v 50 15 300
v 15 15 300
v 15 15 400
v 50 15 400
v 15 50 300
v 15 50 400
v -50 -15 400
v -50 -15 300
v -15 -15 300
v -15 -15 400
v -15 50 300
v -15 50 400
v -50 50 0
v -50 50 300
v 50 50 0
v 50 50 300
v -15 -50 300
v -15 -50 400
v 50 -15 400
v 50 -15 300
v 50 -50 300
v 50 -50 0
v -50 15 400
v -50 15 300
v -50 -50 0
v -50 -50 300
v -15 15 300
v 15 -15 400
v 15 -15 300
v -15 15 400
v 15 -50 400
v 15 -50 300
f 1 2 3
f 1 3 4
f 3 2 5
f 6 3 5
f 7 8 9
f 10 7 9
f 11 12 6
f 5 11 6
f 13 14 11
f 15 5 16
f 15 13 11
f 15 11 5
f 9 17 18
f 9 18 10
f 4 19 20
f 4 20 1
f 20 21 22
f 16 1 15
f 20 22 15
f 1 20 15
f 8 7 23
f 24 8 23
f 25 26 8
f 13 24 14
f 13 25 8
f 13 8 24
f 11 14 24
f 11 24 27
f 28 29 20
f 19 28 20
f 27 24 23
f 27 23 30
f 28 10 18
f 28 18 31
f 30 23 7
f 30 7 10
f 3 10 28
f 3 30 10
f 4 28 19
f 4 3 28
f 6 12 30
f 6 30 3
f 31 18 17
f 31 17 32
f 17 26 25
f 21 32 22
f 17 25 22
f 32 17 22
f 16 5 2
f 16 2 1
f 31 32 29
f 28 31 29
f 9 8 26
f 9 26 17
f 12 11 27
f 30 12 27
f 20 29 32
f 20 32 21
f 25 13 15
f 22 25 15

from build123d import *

# Parameters (mm, degrees)
F0_W     = 100
F0_H     = 100
F1_DEPTH = 300
F2_W     = 30
F2_H     = 35
F2_W_2   = 35
F2_H_2   = 30
F3_DEPTH = 100


with BuildPart() as f1:
    # F0 (on Top) → F1 (new body)
    with BuildSketch(Plane.XY):
        Rectangle(F0_W, F0_H)
    extrude(amount=F1_DEPTH)

    # F2 (on face) → F3 (join)
    with BuildSketch(Plane.XY.offset(300)):
        with Locations((0, 32.5)):
            Rectangle(F2_W, F2_H)
        with Locations((32.5, 0)):
            Rectangle(F2_W_2, F2_H_2)
        Rectangle(F2_W, F2_H_2)
        with Locations((-32.5, 0)):
            Rectangle(F2_W_2, F2_H_2)
        with Locations((0, -32.5)):
            Rectangle(F2_W, F2_H)
    extrude(amount=F3_DEPTH)


solid = f1.part
